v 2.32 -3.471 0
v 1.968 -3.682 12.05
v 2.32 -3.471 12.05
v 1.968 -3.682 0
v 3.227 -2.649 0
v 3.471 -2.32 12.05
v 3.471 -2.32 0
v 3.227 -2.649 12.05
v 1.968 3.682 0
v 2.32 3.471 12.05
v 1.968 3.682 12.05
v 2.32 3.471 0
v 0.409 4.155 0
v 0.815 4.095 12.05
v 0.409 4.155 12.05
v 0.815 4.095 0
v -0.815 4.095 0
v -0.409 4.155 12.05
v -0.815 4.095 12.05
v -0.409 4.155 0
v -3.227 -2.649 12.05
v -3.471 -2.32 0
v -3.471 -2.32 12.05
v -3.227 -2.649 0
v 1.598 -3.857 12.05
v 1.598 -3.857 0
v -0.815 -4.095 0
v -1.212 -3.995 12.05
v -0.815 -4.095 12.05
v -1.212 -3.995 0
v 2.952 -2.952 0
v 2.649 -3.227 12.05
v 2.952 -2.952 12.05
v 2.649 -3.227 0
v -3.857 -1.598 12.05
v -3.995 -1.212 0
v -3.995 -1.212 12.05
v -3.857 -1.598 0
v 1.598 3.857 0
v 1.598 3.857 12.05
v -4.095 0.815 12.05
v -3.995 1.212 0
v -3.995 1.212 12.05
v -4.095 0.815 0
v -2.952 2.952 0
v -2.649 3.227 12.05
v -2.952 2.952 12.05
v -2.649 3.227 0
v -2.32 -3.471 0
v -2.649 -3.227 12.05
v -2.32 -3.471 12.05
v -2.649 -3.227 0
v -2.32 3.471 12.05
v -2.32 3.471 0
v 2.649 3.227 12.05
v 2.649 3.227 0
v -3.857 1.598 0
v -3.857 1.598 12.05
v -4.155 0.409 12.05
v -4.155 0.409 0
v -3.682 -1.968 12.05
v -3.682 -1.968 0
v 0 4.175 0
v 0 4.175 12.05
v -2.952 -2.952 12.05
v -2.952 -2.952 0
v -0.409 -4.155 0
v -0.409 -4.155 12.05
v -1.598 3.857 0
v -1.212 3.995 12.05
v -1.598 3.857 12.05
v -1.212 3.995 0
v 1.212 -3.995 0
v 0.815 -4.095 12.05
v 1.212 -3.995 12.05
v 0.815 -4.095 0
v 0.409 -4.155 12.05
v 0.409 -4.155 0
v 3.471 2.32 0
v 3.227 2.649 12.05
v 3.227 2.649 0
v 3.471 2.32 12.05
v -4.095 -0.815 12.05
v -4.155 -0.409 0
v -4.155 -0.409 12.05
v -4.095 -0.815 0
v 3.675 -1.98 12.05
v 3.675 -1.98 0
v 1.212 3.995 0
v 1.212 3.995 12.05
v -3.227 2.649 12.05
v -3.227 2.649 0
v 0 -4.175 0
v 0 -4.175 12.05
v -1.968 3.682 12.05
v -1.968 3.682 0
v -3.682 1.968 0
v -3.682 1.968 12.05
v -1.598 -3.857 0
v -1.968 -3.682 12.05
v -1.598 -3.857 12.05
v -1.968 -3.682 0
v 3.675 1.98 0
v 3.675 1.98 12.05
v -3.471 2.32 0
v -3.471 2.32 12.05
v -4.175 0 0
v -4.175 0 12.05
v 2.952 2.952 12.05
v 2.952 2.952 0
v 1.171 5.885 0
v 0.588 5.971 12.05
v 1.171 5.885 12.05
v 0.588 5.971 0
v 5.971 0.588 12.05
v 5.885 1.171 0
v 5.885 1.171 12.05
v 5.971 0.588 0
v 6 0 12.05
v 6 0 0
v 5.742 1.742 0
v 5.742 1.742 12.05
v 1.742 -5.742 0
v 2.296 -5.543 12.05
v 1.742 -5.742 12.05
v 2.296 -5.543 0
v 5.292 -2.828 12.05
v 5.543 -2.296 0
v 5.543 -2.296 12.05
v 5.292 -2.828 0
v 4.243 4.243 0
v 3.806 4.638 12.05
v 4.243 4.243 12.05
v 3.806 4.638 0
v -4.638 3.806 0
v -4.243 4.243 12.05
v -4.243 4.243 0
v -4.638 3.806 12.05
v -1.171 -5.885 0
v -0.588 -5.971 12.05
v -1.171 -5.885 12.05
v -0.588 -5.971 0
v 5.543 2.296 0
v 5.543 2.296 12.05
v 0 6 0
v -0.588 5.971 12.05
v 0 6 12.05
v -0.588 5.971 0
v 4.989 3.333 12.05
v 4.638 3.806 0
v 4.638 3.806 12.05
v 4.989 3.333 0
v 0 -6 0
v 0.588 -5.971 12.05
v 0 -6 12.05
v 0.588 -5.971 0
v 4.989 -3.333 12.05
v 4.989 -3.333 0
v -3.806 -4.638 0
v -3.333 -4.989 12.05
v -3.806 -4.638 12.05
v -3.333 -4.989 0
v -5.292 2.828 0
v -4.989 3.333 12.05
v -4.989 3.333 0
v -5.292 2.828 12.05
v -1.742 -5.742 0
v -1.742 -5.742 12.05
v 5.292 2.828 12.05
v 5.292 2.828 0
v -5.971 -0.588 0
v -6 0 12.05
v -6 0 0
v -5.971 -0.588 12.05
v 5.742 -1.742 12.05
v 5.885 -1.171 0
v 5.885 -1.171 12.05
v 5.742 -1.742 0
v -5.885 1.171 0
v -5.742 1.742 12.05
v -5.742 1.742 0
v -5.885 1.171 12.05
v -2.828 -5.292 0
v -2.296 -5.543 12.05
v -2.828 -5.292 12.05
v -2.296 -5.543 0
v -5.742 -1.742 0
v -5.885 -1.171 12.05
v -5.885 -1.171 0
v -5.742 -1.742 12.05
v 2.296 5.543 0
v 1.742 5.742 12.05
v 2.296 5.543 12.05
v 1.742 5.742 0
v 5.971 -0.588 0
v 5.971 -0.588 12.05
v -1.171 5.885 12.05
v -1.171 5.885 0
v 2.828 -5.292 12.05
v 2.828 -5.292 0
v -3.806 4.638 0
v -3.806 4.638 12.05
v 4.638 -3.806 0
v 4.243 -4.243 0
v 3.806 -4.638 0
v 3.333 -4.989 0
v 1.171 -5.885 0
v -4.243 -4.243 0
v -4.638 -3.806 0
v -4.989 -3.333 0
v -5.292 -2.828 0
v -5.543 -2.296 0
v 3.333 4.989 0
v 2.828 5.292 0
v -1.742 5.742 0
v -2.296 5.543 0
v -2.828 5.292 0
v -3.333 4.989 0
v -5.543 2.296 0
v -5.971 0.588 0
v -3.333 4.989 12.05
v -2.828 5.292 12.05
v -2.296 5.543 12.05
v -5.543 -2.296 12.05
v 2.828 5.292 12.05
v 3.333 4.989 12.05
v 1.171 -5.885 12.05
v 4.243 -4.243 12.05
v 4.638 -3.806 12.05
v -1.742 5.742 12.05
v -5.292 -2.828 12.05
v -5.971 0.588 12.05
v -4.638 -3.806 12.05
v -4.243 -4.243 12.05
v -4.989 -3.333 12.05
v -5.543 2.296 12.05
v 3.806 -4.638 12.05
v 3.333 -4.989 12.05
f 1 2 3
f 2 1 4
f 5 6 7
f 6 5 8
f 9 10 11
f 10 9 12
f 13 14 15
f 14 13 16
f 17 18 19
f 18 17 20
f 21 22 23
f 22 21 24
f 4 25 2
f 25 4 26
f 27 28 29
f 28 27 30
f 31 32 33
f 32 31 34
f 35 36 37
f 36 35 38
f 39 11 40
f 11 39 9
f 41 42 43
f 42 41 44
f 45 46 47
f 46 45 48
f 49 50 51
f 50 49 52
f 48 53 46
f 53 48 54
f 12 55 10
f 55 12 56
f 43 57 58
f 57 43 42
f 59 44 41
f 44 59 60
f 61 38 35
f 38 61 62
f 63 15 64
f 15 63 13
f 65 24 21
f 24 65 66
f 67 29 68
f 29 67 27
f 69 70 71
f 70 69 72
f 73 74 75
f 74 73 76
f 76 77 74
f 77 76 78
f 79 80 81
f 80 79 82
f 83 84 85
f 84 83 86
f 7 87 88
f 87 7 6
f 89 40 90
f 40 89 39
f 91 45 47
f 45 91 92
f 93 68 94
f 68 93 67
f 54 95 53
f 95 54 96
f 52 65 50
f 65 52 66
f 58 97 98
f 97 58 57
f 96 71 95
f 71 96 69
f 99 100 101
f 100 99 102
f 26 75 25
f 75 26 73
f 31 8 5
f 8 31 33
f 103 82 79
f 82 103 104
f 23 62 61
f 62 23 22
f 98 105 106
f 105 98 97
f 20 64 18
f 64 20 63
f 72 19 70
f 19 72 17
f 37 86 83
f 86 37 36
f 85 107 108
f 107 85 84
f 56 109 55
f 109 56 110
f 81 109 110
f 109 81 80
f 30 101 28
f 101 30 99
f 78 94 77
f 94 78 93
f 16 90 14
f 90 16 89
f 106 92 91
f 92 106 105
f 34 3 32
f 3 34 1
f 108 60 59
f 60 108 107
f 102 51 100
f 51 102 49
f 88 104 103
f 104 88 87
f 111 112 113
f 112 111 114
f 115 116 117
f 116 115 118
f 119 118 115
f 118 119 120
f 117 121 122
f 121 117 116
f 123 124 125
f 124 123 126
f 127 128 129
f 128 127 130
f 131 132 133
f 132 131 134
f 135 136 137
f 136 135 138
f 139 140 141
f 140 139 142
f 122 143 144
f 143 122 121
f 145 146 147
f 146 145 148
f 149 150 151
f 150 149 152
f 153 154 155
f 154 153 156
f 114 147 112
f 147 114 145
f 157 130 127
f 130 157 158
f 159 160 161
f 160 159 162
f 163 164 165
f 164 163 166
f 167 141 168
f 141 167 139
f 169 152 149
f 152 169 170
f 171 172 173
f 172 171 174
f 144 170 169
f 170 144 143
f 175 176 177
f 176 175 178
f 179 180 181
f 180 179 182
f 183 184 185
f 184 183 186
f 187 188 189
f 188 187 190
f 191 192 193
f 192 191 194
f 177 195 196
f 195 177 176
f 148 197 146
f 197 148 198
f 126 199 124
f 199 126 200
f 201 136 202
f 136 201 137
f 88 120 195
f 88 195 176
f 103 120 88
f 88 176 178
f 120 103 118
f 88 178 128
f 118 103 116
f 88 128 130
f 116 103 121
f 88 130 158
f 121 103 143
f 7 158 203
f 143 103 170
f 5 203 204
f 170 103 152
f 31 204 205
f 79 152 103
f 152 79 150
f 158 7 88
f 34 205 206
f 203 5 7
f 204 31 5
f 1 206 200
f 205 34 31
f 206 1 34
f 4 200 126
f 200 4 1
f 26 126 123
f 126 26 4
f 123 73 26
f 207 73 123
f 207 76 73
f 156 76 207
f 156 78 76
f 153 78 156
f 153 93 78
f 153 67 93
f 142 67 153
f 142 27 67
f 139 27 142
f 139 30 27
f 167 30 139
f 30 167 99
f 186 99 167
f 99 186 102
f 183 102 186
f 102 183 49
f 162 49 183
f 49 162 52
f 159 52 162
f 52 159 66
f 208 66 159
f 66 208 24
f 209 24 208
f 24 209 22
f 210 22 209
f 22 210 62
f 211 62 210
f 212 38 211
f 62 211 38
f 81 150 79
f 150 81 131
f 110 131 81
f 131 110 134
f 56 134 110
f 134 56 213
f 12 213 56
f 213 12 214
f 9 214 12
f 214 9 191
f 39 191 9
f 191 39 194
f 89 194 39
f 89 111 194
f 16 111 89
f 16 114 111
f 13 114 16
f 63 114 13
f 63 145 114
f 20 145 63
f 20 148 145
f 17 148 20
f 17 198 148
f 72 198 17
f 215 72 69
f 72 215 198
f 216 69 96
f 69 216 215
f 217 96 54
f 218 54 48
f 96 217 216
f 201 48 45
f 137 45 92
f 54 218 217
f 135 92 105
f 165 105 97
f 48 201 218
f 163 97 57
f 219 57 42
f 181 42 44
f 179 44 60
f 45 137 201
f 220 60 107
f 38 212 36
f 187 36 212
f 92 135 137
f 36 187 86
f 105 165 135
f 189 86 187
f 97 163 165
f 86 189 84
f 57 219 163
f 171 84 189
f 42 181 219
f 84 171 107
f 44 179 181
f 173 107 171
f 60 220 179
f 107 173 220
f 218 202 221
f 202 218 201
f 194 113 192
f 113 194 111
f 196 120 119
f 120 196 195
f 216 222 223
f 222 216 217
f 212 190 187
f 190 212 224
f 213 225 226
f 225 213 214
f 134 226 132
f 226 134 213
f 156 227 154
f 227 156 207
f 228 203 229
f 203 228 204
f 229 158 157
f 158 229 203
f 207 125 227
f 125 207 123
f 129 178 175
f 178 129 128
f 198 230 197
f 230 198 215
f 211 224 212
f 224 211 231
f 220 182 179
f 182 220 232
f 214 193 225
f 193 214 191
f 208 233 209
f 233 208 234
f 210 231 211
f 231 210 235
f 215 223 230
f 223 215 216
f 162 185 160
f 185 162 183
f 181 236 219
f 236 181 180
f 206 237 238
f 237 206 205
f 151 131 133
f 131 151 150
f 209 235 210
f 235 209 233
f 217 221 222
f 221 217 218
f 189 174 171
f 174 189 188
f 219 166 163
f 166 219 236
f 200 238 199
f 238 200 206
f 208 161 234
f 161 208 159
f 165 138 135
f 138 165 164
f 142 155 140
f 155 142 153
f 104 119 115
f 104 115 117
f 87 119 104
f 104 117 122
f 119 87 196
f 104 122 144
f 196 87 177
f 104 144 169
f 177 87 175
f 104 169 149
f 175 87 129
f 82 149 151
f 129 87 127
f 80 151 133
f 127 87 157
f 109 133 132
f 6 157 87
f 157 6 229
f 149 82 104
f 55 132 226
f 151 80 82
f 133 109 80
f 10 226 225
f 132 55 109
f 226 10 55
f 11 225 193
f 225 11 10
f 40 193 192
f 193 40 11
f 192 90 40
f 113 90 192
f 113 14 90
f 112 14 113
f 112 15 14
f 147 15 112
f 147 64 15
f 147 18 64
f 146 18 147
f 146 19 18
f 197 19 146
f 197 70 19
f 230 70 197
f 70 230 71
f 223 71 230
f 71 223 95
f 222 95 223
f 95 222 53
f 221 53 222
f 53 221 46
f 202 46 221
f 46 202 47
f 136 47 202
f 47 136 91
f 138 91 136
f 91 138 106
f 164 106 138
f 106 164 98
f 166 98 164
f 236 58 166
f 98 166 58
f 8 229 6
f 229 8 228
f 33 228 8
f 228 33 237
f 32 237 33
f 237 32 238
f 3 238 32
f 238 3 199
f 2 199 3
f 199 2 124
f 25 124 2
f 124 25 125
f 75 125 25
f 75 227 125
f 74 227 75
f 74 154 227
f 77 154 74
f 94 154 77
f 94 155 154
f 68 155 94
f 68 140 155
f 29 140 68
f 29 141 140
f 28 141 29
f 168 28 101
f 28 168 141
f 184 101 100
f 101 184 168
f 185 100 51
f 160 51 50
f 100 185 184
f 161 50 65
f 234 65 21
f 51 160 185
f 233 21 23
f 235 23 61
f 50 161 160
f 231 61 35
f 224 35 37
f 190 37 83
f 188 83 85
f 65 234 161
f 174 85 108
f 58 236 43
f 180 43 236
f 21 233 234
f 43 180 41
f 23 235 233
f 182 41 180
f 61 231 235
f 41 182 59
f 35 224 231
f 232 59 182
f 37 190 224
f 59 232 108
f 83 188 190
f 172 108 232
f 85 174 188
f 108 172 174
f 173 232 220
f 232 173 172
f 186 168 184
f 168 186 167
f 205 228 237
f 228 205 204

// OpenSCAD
// file: parameters.scad
// =============================================================================
// Gen-BT — nightly 2026-10-09 (physics_scorer, honest magpylib watts)
// The low-cogging 8-pole / 9-coil line (winding factor 0.945) moved to a larger R53 pole ring with 36–70 mm bobbins and a 13.5 mm build, the best 9-coil row in tonight's scans (Gen-BQ was R52 / 35–70 / 12.6). Smoother to spin by hand and quieter, but still well below 6 coils under the wire budget.
// Clocking 0 deg (magnets N facing S) + D-flat keyed bore + index notch + flip-symmetric hole map.
// Windable 2-piece bobbin; turns = physics_scorer turns_fit; copper only between flanges.
// Steel back-iron: 2× Ø140 × 4.76 mm (3/16") mild-steel discs (steel_backiron_disc.dxf); magnets sit ON the steel
// (through-pockets) -> score with --back-iron.
// =============================================================================
topology            = "dual_rotor";

// --- Wire / winding (physics_scorer winding-fit) -------------------------------
wire_awg            = 26;
wire_od             = 0.45;     // insulated OD mm (bare 0.405)
fill_realistic      = 0.65;     // insulated-wire area / window (DENSE layered wind with a jig; scorer cap 0.65)
turns               = 521;       // = physics_scorer turns_fit (do NOT raise)
coil_former_type    = "bobbin";
coil_core_inset     = 13.50;     // radial copper build: hub = copper boundary inset by this
wind_build_axial    = 0.0;      // nothing proud of the flanges
wind_build_radial   = 0.0;

// --- Bobbin (base + lid) ---------------------------------------------------------
coil_id_r           = 36.00;    // copper boundary sector
coil_od_r           = 70.00;
span_deg            = 34.75;    // = pitch - 2*asin((wall+0.85)/coil_id_r) -> >=1.2 mm stator web
former_web          = 9.45;     // copper height between flanges (TALL copper: steel keeps Bz up)
flange_t            = 0.80;     // >= 0.8 mm FDM wall rule (tall winds push on the flanges)
wall                = 0.80;     // flange lip beyond copper
former_bare_h       = former_web + 2 * flange_t;
coil_envelope_h     = former_bare_h + 2 * wind_build_axial;
tab_w               = 7.0;
tab_len             = 7.0;
tab_h               = former_bare_h / 2;
pin_d               = 1.9;      // 1.75 mm filament locating pin
coil_mount_r        = coil_od_r + 0.2 + 4.0;
lead_y              = 1.6;
lead_slot_w         = 0.9;
lead_groove_d       = 0.6;

// --- Gap -------------------------------------------------------------------------
run_clear           = 0.50;     // rotor face -> flange
gap_spacer_h        = run_clear + wind_build_axial;
m2m                 = coil_envelope_h + 2 * run_clear;   // rotor face to rotor face (= gap_sleeve length)

// --- Stator ----------------------------------------------------------------------
coil_stations       = 9;
bay_clear           = 0.25;
stator_thick        = former_bare_h;                        // bobbins flush both faces
stator_od           = 162.0;
shaft_clear_stator  = 14.0;     // stator is static; gap sleeve OD 12 spins inside

// --- Rotor(s) --------------------------------------------------------------------
magnet_Br           = 1.43;     // N52
magnet_d_large      = 20.0;
magnet_h_large      = 5.0;      // one O20x5 per pocket
magnet_h_small      = 5.0;      // one O5x5 per pocket
halbach_magnetisation = "diametric"; // O5x5 assist magnets MUST be DIAMETRICALLY magnetised (tangential)
rotor_b_same_axis   = true;     // same-index magnets share one axis: N faces S across the gap
large_pocket_d      = 20.3;
small_pocket_d      = 5.3;
pocket_h            = 5.00;     // THROUGH the carrier: magnet back face sits on the steel disc (FLUSH seat: carrier = magnet height, magnet face level with the rotor face)
large_n             = 8;
R_large             = 53.0;
R_small_inner       = 45.0;
R_small_mid         = 53.0;
R_small_outer       = 61.0;
small_r_list        = [R_small_inner, R_small_mid, R_small_outer];   // O5 pockets between poles
carrier_od          = 140.0;
carrier_thick       = pocket_h;
hub_h               = 12.0;     // > steel_t + insert: radial set-screw clears the steel
hub_od              = 24.0;     // slim hub so the M4 brace rods fit at R~18 inside the coil ring
hub_insert_d        = 4.0;      // M3 heat-set insert, radial, bears on the D-flat
rotor_b_offset_deg  = 0.0;      // CLOCKING: magnets directly opposite
shaft_key           = "dflat";
dflat_depth         = 0.5;      // 8 mm shaft with 0.5 mm flat (7.5 across flat)
index_notch_d       = 3.0;

// --- Steel back-iron (buyable laser-cut) -------------------------------------------
steel_t             = 4.76;      // mild steel thickness (image method ignores it; sized from steel_flux.py so the return path stays well below saturation)
steel_center_hole   = 26.0;     // slips over the rotor hub (OD 24)
steel_od            = carrier_od;   // steel disc OD = rotor carrier OD

// --- Modular MAX interface ----------------------------------------------------------
shaft_bore          = 8.35;
dflat_x             = 4.0 - dflat_depth + (shaft_bore - 8.0) / 2;
bearing_d           = 21.85;
bearing_h           = 7.2;
m3_clear            = 3.5;
bolt_r_inner        = 30.0;     // M3 steel-disc clamp bolts (inside the magnet ring)
bolt_n_inner        = 4;
bolt_inner_angles   = [0, 90, 180, 270];
bolt_r_outer        = 66.0;     // M3 steel-disc clamp bolts (outside the magnet ring)
bolt_outer_angles   = [45, 135, 225, 315];
flange_bolt_r       = 76.0;     // frame rods: OUTSIDE the rotor OD (rotors spin inside them)
flange_bolt_n       = 9;
flange_bolt_offset  = 20.00;    // between coil stations -> never cuts a lead groove/tab
brace_r             = 18.0;
brace_d             = 4.3;      // temporary M4 jack rods (assembly only)
brace_n             = 4;
brace_angles        = [45, 135, 225, 315];          // flip-symmetric

spacer_pad_od       = 14.0;
spacer_pad_id       = m3_clear;
endbell_od          = 162.0;
endbell_thick       = 8.0;
endbell_shaft_clear = 10.0;
collar_h            = 10.0;
standoff_od         = 9.0;
frame_standoff_h    = run_clear + carrier_thick + hub_h + collar_h + 2.0;
sleeve_od           = 12.0;
plate_max_mm        = 410;

$fn = 64;
// main file
// Gen-BT — gap sleeve: rigid spacer on the shaft BETWEEN the two rotor carriers (passes through the stator
// hole). Length = m2m, so it sets the magnet gap and carries the full magnet pull. Print x1, upright.
include <parameters.scad>;
$fn = 64;
// D-flat keyed bore: flat faces +X (angle 0 = magnet pocket 0 = index notch)
module dflat_bore(h) {
    intersection() {
        cylinder(d=shaft_bore, h=h);
        translate([-shaft_bore, -shaft_bore, 0]) cube([shaft_bore + dflat_x, 2*shaft_bore, h]);
    }
}

difference() {
    cylinder(d=sleeve_od, h=m2m);
    translate([0, 0, -0.1]) dflat_bore(m2m + 0.2);
}
